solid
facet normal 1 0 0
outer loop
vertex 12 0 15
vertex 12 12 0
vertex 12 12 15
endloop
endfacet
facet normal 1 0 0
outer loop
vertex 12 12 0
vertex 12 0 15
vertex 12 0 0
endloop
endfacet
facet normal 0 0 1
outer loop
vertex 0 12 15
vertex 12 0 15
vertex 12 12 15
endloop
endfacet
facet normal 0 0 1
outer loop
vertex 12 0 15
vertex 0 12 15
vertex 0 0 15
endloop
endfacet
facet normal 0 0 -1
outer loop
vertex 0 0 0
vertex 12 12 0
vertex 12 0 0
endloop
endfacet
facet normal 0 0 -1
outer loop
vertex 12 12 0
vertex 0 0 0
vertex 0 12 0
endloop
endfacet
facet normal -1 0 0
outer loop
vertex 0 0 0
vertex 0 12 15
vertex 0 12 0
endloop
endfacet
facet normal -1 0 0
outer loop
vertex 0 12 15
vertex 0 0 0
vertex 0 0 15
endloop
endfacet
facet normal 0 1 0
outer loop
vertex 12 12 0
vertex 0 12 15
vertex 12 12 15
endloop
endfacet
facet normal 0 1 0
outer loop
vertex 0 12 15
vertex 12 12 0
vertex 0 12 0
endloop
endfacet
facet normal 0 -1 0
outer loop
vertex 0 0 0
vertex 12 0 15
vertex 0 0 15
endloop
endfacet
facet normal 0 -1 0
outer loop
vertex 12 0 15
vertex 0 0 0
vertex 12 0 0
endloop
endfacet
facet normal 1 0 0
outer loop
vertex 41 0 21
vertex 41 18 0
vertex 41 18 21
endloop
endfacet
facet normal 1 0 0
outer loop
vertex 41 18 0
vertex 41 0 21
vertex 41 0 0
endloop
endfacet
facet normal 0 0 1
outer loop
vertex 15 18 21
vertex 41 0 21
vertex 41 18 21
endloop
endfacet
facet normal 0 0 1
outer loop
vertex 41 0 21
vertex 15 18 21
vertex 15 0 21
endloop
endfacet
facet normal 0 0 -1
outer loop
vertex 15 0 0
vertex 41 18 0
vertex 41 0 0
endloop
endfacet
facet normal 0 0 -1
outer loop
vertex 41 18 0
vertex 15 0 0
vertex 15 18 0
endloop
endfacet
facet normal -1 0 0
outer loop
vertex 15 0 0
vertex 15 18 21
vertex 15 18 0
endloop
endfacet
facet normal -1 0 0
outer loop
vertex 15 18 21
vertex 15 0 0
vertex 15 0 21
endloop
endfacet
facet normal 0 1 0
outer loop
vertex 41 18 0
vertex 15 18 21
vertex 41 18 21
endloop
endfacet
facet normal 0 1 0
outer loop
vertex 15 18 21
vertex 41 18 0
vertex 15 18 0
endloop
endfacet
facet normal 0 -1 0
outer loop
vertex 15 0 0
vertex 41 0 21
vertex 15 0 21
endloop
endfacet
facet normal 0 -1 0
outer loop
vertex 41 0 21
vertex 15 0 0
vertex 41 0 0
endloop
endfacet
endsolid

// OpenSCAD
$fn=50;
e=0.1;

ir_support_width = 12;
ir_support_height = 15;

wing_support_width = 26;
wing_support_depth = 18;
wing_support_height = 21;


// ir support
cube([ir_support_width, ir_support_width, ir_support_height]);

// wing support
translate([ir_support_width + 3, 0, 0])
    cube([wing_support_width, wing_support_depth, wing_support_height]);
